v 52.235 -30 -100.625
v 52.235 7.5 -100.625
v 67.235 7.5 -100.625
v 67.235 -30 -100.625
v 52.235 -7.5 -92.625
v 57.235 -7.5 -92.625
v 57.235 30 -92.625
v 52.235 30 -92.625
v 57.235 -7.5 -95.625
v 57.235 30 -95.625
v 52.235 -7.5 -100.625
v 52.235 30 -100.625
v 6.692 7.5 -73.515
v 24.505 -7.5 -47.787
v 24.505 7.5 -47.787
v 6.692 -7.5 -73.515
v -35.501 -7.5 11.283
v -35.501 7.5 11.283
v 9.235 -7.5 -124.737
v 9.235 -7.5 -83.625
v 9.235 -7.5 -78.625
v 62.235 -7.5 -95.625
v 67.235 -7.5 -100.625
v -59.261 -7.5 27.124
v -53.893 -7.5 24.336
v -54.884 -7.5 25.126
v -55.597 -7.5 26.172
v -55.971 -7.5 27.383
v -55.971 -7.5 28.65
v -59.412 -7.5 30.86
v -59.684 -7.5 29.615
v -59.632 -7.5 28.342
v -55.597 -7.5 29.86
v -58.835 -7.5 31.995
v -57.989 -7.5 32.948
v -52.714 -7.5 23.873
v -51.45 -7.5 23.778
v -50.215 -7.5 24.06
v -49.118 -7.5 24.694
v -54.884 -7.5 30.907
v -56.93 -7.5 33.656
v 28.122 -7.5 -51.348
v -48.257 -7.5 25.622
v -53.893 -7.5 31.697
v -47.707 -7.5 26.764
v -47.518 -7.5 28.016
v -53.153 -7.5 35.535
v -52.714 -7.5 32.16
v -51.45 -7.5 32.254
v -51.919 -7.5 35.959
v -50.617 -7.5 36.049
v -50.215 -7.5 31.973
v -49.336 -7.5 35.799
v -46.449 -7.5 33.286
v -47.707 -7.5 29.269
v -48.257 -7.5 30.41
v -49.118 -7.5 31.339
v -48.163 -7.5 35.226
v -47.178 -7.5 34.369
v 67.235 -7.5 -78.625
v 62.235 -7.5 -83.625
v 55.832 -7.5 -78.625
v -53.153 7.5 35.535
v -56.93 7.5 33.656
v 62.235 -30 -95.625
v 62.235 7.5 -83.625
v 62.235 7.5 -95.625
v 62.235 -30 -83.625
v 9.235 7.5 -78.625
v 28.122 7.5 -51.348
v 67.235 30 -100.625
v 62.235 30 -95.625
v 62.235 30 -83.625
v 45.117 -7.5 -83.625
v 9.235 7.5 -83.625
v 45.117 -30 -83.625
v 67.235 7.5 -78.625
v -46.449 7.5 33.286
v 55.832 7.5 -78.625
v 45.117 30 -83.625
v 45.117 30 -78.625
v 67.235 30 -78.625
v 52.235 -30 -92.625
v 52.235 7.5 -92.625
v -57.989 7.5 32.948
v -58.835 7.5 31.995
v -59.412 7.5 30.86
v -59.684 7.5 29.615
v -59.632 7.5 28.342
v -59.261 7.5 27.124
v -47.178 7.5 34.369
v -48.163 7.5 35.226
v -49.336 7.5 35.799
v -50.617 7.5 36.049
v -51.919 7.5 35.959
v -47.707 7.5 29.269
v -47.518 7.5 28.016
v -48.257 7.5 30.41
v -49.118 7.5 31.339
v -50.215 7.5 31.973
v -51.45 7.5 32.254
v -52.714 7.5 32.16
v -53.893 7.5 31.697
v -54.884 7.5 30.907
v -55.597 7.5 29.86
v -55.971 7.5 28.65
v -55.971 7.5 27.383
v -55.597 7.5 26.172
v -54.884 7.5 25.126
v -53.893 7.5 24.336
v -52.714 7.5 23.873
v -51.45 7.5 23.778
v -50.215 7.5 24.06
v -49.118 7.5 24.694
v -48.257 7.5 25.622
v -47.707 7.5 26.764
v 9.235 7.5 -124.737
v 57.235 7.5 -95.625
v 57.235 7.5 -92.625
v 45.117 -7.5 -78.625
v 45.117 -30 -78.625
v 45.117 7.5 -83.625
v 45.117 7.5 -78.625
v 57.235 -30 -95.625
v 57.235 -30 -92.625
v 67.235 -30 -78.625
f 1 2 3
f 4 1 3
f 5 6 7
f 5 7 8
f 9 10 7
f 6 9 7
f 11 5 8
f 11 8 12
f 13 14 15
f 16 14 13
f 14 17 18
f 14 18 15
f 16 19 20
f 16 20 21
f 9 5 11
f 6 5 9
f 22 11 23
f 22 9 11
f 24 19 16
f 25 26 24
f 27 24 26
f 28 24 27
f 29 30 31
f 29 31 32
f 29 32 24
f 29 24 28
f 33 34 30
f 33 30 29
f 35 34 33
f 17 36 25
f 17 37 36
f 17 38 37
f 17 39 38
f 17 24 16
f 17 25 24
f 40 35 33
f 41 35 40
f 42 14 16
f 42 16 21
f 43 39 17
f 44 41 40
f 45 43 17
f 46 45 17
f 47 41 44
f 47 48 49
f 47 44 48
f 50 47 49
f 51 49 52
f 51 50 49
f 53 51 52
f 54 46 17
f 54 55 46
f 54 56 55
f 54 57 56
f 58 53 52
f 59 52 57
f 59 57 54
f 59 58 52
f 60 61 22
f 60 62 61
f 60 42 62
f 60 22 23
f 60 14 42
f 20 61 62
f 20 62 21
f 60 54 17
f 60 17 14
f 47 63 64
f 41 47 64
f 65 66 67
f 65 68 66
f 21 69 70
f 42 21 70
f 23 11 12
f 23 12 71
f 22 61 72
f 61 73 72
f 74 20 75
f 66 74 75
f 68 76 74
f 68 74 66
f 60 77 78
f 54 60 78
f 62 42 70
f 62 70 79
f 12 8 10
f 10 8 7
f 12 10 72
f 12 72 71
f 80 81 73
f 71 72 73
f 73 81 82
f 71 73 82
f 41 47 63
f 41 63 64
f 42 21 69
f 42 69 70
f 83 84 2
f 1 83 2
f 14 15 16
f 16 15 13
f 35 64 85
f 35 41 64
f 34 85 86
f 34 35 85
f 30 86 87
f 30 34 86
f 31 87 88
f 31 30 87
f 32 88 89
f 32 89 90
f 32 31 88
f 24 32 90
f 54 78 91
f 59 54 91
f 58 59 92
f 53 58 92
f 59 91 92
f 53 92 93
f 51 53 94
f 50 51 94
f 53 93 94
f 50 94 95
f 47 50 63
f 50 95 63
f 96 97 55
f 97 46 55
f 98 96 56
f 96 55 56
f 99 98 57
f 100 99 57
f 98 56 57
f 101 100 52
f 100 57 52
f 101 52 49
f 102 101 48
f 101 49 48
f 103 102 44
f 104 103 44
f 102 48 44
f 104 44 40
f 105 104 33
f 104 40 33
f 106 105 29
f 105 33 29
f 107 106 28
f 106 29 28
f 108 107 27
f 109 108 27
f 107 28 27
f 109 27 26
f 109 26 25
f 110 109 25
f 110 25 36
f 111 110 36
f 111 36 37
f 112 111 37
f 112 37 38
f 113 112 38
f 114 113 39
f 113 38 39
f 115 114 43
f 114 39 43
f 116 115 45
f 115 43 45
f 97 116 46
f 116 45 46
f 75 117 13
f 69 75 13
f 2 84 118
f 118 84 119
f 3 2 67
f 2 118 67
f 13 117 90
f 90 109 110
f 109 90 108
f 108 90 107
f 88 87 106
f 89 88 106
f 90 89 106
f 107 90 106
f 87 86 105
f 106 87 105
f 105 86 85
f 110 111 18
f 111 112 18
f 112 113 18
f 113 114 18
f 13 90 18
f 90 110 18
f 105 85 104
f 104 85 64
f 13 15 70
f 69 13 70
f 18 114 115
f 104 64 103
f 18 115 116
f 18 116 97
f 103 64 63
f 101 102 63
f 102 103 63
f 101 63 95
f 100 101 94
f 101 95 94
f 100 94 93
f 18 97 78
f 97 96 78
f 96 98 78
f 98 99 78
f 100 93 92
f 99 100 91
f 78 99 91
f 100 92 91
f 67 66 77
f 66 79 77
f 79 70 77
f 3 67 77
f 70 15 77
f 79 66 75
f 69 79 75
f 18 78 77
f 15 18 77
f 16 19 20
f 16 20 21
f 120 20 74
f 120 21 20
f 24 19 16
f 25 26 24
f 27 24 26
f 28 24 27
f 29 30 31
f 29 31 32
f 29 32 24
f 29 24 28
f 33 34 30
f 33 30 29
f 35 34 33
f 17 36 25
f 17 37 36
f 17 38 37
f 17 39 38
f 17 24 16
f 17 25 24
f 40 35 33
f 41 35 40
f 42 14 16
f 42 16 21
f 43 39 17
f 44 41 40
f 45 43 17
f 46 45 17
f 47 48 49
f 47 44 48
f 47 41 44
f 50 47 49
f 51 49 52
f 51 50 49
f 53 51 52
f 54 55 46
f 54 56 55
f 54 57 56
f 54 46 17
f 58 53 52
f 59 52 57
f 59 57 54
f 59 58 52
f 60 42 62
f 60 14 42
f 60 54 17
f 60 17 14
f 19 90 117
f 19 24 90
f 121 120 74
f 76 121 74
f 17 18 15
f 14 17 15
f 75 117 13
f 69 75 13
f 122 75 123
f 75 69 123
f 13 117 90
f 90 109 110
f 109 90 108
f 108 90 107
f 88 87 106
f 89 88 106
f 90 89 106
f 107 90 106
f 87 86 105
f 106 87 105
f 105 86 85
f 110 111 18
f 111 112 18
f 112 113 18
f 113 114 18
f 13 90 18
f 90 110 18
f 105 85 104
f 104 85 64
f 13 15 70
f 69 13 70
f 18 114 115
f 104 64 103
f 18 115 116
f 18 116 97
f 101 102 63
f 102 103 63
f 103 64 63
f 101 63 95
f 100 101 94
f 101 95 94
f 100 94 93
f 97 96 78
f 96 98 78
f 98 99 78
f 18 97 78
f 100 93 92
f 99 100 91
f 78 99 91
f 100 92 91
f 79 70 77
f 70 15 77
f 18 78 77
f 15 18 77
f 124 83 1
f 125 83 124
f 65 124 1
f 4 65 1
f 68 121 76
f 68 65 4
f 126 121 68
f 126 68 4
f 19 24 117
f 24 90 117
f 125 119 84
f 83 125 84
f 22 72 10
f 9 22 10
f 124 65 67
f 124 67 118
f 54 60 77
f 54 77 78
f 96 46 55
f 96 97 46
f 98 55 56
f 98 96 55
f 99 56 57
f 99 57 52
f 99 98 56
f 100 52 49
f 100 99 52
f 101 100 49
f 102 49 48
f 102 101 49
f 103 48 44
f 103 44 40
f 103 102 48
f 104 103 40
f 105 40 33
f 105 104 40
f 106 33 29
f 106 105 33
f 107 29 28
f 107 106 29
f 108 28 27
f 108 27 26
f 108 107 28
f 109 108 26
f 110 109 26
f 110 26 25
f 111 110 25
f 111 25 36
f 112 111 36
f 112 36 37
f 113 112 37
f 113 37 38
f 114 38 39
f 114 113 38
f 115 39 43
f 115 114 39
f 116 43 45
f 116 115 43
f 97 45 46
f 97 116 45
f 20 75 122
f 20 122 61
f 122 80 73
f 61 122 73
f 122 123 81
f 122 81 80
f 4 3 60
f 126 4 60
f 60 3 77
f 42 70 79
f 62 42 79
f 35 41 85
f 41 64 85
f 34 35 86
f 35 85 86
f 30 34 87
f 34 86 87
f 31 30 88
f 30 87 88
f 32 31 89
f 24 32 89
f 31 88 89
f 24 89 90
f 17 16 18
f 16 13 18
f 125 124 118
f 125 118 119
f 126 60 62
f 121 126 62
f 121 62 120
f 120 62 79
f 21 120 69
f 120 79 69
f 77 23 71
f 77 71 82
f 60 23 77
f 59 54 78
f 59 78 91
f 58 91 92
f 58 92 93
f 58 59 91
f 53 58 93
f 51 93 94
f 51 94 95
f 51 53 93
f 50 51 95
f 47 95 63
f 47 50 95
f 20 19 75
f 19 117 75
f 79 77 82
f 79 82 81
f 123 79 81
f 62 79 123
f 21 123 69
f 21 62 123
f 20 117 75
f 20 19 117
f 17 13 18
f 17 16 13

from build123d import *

# Parameters (mm, degrees)
F0_R     = 4.25
F1_DEPTH = 7.5
F2_DEPTH = 7.5
F3_DEPTH = 30


with BuildPart() as f1:
    # F0 (on Front) → F1 (new body, symmetric)
    with BuildSketch(Plane.XZ):
        with BuildLine():
            Line((9.235449, -124.736929), (9.235449, -83.625269))
            Line((9.235449, -83.625269), (45.117028, -83.625269))
            Line((45.117028, -83.625269), (45.117028, -78.625269))
            Line((45.117028, -78.625269), (9.235449, -78.625269))
            Line((9.235449, -78.625269), (6.692474, -73.514574))
            Line((6.692474, -73.514574), (-35.500905, 11.282746))
            Line((-35.500905, 11.282746), (-46.449409, 33.286288))
            ThreePointArc((-46.449409, 33.286288), (-49.33554, 35.799236), (-53.153265, 35.535356))
            Line((-53.153265, 35.535356), (-56.930254, 33.656006))
            ThreePointArc((-56.930254, 33.656006), (-59.412144, 30.859615), (-59.260681, 27.123757))
            Line((-59.260681, 27.123757), (9.235449, -124.736929))
        make_face()
        with Locations((-51.76803, 28.016366)):
            Circle(F0_R, mode=Mode.SUBTRACT)
        Polygon((28.121848, -51.347594), (55.831752, -78.625269), (67.235449, -78.625269), (-46.449409, 33.286288), (-35.500905, 11.282746), (24.505301, -47.78746), align=None)
        Polygon((6.692474, -73.514574), (9.235449, -78.625269), (28.121848, -51.347594), (24.505301, -47.78746), align=None)
    extrude(amount=F1_DEPTH, both=True)

    # F0 (on Front) → F2 (join, symmetric)
    with BuildSketch(Plane.XZ):
        Polygon((45.117028, -78.625269), (45.117028, -83.625269), (62.235449, -83.625269), (62.235449, -95.625269), (57.235449, -95.625269), (57.235449, -92.625269), (52.235449, -92.625269), (52.235449, -100.625269), (67.235449, -100.625269), (67.235449, -78.625269), (55.831752, -78.625269), align=None)
        with BuildLine():
            Line((9.235449, -124.736929), (9.235449, -83.625269))
            Line((9.235449, -83.625269), (45.117028, -83.625269))
            Line((45.117028, -83.625269), (45.117028, -78.625269))
            Line((45.117028, -78.625269), (9.235449, -78.625269))
            Line((9.235449, -78.625269), (6.692474, -73.514574))
            Line((6.692474, -73.514574), (-35.500905, 11.282746))
            Line((-35.500905, 11.282746), (-46.449409, 33.286288))
            ThreePointArc((-46.449409, 33.286288), (-49.33554, 35.799236), (-53.153265, 35.535356))
            Line((-53.153265, 35.535356), (-56.930254, 33.656006))
            ThreePointArc((-56.930254, 33.656006), (-59.412144, 30.859615), (-59.260681, 27.123757))
            Line((-59.260681, 27.123757), (9.235449, -124.736929))
        make_face()
        with Locations((-51.76803, 28.016366)):
            Circle(F0_R, mode=Mode.SUBTRACT)
    extrude(amount=F2_DEPTH, both=True)

    # F0 (on Front) → F3 (join)
    with BuildSketch(Plane.XZ):
        Polygon((45.117028, -78.625269), (45.117028, -83.625269), (62.235449, -83.625269), (62.235449, -95.625269), (57.235449, -95.625269), (57.235449, -92.625269), (52.235449, -92.625269), (52.235449, -100.625269), (67.235449, -100.625269), (67.235449, -78.625269), (55.831752, -78.625269), align=None)
    extrude(amount=F3_DEPTH)


with BuildPart() as f4_1:
    # F4: instance of F1
    add(f1.part.mirror(Plane.XZ))


solid = Compound([f1.part, f4_1.part])
